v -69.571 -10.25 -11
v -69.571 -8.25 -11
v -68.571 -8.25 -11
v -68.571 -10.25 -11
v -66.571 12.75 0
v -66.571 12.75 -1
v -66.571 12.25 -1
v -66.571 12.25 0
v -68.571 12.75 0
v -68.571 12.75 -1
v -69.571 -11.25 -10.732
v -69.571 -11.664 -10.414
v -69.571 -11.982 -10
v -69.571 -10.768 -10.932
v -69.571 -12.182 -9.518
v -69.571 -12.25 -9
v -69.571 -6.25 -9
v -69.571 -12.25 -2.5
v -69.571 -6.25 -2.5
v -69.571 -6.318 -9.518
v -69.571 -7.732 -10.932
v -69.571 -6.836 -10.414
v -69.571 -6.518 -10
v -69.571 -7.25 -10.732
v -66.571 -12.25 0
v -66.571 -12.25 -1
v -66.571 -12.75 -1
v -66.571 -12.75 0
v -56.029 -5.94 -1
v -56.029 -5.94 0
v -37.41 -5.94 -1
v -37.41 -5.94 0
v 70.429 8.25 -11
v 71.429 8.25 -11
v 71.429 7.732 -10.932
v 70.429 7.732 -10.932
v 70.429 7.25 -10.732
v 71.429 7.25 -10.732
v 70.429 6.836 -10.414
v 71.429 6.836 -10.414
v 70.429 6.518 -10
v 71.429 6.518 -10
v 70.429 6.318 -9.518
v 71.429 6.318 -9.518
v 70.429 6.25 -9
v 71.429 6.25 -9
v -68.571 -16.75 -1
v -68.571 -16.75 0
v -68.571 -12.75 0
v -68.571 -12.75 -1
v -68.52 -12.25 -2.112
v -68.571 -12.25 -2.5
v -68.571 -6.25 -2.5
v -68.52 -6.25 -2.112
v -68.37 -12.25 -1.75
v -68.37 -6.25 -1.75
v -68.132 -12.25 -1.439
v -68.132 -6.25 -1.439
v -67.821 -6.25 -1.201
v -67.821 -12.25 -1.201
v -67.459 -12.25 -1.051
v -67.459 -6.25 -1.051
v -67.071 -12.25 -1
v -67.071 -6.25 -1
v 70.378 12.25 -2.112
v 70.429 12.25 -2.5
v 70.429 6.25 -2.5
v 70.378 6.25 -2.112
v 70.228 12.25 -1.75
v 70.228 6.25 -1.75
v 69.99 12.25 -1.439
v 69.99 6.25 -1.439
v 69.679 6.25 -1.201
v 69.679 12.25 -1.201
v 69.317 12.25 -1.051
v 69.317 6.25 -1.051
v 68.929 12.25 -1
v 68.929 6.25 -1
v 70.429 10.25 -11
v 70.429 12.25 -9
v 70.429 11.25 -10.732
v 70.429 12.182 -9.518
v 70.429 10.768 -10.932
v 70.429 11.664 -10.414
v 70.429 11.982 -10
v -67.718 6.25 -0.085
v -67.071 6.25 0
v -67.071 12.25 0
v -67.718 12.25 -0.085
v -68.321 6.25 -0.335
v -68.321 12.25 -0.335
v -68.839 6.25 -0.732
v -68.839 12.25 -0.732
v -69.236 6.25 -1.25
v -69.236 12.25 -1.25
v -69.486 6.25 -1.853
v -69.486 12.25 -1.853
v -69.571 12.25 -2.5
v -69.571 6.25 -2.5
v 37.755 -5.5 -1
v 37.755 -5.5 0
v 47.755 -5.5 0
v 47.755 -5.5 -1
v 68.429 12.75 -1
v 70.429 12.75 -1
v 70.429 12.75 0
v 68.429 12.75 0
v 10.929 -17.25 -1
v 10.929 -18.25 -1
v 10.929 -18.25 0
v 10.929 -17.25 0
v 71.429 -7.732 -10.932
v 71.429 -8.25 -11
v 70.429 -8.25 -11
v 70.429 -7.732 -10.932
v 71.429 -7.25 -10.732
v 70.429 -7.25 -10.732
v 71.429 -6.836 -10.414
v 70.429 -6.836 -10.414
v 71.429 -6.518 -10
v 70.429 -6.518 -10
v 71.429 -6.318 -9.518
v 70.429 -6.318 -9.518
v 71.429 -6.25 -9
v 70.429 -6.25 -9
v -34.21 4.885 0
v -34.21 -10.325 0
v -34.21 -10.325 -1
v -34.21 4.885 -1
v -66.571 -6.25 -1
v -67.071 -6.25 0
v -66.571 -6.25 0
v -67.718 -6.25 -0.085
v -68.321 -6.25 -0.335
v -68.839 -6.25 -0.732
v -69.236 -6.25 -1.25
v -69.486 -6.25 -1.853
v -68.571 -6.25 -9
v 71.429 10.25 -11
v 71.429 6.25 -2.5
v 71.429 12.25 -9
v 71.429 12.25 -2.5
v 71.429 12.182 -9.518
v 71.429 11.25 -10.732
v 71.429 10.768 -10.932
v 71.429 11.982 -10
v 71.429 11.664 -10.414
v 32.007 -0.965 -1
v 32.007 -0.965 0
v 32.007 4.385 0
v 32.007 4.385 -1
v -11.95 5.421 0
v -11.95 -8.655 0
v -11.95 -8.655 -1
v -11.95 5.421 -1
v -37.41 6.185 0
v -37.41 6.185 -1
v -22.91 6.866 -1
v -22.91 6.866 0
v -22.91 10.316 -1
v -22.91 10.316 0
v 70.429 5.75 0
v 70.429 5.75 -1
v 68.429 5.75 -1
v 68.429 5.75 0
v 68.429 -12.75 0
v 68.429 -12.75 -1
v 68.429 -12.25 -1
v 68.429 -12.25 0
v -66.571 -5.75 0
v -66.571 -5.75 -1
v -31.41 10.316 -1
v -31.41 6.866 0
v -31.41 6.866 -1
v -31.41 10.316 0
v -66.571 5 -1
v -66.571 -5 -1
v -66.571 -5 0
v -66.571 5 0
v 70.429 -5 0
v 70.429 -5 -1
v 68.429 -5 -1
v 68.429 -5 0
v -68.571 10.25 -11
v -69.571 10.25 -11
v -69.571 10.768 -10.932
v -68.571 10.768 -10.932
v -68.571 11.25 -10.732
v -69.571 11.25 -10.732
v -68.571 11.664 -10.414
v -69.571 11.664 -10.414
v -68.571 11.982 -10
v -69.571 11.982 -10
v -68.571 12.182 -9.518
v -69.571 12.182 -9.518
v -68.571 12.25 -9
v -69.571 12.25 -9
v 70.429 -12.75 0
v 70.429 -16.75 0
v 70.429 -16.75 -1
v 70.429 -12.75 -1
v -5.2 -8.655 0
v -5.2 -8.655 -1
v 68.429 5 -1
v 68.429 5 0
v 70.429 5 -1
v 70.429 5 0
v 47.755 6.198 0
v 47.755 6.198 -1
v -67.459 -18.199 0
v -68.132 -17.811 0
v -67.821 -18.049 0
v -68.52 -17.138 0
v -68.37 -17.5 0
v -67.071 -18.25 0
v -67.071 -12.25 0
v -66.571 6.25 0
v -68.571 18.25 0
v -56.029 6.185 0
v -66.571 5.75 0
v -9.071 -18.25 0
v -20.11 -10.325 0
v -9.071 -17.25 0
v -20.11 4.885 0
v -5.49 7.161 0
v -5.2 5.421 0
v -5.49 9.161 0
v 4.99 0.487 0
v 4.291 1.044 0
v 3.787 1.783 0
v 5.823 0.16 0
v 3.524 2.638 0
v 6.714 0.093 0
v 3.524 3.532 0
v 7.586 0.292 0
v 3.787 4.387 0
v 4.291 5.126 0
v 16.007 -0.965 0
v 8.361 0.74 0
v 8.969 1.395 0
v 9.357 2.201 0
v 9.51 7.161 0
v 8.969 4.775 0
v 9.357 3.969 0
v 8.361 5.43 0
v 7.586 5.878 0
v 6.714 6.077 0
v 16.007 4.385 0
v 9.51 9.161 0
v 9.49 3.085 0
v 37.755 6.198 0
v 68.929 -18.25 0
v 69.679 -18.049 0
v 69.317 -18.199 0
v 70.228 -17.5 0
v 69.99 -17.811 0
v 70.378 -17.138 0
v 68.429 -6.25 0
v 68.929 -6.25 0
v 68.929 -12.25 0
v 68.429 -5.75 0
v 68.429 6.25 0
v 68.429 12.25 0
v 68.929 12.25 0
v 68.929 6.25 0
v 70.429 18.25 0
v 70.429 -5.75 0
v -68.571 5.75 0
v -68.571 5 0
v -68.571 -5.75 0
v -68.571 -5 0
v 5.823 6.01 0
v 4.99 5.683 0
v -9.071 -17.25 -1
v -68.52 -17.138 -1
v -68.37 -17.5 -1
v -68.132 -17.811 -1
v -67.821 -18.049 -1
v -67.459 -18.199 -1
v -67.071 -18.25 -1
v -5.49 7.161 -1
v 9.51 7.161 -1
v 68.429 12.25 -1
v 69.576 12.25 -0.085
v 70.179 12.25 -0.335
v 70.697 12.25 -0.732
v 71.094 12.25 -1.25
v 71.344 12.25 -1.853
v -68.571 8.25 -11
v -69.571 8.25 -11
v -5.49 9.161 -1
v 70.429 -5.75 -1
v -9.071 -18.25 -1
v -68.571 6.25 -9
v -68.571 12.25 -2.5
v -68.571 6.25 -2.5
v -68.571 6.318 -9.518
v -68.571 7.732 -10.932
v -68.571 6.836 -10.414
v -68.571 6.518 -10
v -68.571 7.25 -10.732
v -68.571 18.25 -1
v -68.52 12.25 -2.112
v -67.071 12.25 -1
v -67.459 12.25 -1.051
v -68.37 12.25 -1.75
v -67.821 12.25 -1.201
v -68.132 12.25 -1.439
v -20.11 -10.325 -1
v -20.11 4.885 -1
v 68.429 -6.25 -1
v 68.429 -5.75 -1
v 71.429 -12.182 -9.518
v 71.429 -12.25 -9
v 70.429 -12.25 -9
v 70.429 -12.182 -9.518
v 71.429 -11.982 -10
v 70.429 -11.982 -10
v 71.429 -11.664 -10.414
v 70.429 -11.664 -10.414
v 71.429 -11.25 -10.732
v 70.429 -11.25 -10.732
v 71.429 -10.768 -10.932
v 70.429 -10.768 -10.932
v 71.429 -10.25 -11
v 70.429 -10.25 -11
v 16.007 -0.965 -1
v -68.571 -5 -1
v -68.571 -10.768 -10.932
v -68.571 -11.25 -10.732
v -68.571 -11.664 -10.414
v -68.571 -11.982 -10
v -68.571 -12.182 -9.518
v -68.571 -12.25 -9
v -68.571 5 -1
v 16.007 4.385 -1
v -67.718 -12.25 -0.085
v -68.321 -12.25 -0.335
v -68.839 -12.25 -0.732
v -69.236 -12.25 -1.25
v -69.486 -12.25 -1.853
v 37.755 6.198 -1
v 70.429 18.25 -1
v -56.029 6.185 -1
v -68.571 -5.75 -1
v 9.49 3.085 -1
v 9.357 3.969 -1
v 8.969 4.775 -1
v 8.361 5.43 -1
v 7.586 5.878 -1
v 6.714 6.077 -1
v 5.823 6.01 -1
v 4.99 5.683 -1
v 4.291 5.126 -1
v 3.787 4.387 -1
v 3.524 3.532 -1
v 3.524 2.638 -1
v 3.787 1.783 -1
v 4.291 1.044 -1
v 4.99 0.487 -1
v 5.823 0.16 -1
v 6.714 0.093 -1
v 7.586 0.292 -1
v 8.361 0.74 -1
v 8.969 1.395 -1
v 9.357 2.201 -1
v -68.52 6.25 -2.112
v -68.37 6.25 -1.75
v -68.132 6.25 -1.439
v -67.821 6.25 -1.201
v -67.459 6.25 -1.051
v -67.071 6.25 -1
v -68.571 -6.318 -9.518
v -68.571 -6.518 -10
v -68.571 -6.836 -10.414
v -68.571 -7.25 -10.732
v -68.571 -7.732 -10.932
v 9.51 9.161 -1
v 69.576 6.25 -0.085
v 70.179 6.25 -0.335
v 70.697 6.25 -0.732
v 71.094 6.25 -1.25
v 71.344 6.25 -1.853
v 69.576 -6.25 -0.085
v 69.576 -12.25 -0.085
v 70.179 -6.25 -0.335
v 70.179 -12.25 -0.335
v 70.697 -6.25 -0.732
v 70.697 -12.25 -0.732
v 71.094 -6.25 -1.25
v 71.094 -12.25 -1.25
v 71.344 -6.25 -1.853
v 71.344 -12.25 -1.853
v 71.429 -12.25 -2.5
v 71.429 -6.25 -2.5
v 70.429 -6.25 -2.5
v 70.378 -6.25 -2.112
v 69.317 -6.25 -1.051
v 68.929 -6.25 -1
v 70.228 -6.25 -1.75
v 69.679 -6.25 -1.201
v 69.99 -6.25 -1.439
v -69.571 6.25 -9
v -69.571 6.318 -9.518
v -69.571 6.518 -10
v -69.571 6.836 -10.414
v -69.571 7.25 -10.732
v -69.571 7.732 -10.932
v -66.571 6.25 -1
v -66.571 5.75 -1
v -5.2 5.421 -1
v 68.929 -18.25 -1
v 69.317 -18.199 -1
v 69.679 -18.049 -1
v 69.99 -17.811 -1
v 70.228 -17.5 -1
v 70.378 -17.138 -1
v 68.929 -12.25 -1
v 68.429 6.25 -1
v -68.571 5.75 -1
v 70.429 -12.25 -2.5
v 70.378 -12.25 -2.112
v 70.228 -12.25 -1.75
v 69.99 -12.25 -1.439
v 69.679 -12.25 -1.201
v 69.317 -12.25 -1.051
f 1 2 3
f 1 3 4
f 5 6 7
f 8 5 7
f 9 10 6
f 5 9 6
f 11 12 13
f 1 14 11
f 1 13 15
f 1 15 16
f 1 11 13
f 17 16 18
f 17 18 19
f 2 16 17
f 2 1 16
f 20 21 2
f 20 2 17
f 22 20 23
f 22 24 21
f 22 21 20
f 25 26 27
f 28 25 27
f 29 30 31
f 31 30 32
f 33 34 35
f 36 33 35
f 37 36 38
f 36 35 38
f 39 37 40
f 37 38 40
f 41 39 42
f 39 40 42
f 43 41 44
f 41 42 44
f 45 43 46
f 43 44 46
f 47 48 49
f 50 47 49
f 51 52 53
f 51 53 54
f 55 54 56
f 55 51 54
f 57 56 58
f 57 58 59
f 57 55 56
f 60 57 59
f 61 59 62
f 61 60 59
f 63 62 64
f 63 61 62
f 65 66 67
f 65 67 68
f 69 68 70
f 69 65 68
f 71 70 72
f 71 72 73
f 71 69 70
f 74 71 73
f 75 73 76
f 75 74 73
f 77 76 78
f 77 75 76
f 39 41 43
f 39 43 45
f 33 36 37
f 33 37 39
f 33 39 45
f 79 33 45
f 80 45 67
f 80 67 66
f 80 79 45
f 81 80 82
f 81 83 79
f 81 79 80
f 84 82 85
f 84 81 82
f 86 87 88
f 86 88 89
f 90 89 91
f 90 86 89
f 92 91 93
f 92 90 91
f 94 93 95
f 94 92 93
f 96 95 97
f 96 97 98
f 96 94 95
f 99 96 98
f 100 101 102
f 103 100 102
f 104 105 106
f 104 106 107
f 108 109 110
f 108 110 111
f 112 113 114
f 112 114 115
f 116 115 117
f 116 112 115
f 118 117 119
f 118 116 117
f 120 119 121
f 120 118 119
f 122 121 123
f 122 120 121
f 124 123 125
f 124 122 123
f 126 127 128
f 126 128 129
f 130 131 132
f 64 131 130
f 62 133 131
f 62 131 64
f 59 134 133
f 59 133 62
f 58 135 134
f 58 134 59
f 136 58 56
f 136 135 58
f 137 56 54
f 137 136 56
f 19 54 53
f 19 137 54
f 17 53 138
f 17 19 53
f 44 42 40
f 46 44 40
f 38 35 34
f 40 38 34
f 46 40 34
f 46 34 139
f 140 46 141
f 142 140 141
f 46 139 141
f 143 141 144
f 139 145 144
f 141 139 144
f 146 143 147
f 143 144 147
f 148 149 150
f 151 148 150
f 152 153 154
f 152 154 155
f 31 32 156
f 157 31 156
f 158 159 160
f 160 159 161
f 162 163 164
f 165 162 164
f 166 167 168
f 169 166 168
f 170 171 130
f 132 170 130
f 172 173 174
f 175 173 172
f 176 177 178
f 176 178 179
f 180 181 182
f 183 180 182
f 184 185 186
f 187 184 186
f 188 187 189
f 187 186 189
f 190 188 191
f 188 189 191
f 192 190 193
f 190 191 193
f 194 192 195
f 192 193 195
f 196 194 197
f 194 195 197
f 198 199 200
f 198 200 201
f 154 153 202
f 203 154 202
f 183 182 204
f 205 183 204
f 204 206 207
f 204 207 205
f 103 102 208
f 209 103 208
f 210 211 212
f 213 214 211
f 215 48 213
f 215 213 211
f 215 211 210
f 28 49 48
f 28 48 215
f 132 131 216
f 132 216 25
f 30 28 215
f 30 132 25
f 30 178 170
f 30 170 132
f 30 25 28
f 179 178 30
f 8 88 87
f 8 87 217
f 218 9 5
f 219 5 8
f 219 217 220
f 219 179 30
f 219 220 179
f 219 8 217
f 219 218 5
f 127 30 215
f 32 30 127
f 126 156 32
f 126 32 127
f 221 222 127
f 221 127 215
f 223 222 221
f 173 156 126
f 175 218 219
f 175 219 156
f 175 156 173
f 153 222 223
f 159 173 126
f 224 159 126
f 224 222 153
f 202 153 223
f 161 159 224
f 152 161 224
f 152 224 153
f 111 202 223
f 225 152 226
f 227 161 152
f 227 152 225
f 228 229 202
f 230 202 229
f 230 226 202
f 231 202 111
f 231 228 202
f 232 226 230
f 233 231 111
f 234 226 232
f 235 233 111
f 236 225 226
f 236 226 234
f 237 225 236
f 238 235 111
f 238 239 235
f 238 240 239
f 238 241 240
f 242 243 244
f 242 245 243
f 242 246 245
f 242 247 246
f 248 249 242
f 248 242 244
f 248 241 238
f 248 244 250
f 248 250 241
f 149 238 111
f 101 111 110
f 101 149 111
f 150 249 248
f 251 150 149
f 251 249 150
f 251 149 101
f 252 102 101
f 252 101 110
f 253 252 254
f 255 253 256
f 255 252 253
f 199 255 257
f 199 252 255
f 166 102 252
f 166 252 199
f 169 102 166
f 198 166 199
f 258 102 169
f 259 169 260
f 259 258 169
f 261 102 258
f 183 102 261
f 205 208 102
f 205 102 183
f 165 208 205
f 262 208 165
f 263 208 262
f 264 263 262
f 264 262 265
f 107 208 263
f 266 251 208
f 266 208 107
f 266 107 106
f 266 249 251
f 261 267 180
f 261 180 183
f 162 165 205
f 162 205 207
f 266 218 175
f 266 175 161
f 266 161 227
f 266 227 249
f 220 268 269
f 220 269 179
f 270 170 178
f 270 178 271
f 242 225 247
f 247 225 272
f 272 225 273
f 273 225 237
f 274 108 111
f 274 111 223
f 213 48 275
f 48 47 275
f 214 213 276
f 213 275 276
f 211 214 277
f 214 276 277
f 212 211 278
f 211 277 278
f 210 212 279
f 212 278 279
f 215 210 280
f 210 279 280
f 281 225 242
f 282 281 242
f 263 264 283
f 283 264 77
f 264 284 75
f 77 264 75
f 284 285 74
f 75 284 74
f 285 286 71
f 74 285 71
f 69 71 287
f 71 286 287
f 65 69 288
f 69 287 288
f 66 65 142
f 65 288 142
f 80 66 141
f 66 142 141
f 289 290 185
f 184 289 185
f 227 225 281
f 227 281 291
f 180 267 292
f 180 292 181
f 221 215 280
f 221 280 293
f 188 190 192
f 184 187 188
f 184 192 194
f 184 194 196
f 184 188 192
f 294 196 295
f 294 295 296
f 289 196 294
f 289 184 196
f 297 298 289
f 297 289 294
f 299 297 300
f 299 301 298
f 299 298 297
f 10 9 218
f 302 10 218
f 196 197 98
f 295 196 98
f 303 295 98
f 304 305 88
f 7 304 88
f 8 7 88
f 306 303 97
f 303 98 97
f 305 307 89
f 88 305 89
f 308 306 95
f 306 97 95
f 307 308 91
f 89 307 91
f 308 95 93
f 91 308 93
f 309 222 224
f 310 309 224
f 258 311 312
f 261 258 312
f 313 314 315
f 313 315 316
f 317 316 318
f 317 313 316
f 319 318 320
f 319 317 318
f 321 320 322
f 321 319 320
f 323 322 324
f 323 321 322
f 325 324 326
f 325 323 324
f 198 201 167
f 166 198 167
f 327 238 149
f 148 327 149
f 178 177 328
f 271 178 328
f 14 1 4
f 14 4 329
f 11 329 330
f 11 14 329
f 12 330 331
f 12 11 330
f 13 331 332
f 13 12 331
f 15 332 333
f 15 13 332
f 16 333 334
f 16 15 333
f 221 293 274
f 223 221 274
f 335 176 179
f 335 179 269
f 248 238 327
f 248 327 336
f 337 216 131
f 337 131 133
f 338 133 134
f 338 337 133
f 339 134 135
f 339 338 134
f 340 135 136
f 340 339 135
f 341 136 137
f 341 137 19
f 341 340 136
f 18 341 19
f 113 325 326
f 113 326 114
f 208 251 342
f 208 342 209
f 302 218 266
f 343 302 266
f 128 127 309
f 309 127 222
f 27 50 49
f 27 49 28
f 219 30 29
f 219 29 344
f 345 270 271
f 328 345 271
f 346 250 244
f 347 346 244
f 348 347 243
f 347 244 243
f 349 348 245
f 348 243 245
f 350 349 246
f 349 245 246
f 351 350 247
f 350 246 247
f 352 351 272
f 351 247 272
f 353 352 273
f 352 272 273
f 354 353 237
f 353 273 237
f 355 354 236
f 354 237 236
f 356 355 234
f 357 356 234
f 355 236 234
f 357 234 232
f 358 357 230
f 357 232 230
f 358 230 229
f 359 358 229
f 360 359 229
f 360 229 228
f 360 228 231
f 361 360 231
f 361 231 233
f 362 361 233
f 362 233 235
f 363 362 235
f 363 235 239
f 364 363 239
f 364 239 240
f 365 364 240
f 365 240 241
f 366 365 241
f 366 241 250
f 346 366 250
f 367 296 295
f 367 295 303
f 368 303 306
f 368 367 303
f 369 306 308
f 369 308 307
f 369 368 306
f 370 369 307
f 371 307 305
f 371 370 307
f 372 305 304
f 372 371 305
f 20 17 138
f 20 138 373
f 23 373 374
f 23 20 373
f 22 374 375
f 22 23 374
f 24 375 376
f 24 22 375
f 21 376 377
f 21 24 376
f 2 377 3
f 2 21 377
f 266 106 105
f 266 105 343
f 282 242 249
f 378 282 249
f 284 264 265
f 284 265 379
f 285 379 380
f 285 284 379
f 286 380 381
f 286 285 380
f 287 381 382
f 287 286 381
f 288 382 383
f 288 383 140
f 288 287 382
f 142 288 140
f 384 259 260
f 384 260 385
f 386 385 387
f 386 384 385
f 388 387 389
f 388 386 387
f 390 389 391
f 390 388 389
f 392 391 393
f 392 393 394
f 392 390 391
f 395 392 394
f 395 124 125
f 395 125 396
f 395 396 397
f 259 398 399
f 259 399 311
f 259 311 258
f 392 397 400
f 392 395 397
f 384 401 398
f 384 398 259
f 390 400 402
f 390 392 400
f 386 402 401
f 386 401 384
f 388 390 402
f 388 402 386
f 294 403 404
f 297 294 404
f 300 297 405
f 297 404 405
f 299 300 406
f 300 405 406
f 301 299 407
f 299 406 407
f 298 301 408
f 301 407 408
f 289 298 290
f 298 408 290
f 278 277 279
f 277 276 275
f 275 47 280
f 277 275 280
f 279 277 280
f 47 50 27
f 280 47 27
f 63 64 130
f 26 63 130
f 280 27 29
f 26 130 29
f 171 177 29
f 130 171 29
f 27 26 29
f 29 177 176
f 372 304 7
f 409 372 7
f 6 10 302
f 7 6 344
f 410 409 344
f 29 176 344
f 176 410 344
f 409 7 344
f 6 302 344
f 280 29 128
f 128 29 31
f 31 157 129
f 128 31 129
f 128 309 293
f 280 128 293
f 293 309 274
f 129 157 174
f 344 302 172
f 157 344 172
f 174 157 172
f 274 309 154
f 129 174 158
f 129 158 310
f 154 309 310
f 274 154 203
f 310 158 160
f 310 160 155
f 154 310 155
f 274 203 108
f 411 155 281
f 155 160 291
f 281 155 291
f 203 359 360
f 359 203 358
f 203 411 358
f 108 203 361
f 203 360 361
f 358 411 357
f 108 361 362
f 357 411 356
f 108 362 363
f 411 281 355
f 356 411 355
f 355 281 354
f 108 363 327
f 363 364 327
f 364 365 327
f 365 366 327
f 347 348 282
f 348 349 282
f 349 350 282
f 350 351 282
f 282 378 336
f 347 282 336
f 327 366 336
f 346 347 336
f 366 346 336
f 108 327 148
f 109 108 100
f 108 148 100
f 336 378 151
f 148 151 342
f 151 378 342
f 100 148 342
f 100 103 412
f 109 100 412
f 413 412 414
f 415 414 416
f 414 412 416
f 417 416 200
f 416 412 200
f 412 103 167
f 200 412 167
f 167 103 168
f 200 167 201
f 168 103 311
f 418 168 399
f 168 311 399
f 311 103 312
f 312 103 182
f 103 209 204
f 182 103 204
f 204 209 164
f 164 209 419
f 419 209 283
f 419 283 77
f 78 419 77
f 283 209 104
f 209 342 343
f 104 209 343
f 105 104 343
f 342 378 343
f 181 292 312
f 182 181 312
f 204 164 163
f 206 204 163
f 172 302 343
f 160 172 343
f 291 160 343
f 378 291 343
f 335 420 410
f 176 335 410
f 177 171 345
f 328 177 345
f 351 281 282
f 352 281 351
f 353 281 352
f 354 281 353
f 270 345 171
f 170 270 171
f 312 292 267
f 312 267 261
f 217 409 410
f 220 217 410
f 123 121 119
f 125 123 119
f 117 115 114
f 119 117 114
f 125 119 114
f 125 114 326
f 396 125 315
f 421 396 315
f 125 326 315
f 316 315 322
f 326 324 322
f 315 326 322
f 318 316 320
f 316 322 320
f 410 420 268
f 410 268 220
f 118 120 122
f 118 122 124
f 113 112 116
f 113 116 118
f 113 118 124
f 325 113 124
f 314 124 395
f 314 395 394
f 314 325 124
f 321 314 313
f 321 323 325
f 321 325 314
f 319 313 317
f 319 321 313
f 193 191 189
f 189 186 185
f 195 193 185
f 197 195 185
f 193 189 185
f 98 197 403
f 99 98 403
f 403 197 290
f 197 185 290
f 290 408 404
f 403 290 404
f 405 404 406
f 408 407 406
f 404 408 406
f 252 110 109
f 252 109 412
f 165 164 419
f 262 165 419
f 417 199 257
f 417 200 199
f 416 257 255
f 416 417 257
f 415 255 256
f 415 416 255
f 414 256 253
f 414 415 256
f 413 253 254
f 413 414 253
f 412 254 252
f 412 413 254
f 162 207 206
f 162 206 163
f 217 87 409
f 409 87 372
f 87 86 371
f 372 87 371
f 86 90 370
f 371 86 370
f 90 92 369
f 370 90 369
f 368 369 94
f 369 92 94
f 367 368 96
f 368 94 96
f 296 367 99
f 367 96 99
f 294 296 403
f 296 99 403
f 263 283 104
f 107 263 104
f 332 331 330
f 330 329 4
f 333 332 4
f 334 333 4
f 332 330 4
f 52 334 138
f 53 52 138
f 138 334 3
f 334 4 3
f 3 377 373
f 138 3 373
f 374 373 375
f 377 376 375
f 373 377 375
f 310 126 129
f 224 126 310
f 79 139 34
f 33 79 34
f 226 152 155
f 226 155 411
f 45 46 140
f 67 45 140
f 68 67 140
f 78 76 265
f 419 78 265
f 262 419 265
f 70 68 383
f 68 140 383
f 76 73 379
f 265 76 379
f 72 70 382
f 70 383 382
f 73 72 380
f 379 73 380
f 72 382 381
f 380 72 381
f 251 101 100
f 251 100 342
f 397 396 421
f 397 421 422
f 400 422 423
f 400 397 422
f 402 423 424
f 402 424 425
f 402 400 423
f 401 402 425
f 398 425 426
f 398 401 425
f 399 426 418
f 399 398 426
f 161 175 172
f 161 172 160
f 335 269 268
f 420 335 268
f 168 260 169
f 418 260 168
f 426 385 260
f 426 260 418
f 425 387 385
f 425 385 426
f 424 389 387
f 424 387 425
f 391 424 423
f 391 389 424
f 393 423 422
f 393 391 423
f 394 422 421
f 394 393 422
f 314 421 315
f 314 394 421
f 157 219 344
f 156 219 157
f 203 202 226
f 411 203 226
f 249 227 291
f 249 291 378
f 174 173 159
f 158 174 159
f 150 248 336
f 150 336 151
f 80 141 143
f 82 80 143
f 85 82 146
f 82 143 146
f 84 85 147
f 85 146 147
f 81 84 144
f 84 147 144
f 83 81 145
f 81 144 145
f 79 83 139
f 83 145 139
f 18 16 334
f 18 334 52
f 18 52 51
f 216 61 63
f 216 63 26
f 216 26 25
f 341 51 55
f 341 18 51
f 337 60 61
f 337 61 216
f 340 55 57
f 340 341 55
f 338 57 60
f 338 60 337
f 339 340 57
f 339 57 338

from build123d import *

# Parameters (mm, degrees)
SKETCH1_W                       = 139
SKETCH1_H                       = 36.5
BASE_FLANGE1_DEPTH              = 1
EDGE_FLANGE1_STRIP_W            = 7
EDGE_FLANGE1_STRIP_H            = 1
EDGE_FLANGE1_STRIP_CUT_DEPTH    = 6
EDGE_FLANGE1_RELIEF_W           = 7.5
EDGE_FLANGE1_RELIEF_H           = 0.5
EDGE_FLANGE1_RELIEF_CUT_DEPTH   = 1
EDGE_FLANGE1_STRIP_2_W          = 7
EDGE_FLANGE1_STRIP_2_H          = 1
EDGE_FLANGE1_STRIP_CUT_2_DEPTH  = 6
EDGE_FLANGE1_RELIEF_2_W         = 7.5
EDGE_FLANGE1_RELIEF_2_H         = 0.5
EDGE_FLANGE1_RELIEF_CUT_2_DEPTH = 1
EDGE_FLANGE1_DEPTH              = 6
EDGE_FLANGE1_START              = -1
EDGE_FLANGE1_FLAT_DEPTH         = 1
EDGE_FLANGE1_BEND_DEPTH         = 6
EDGE_FLANGE1_FLAT_2_DEPTH       = 1
EDGE_FLANGE2_STRIP_W            = 7
EDGE_FLANGE2_STRIP_H            = 1
EDGE_FLANGE2_STRIP_CUT_DEPTH    = 6
EDGE_FLANGE2_RELIEF_W           = 7.5
EDGE_FLANGE2_RELIEF_H           = 0.5
EDGE_FLANGE2_RELIEF_CUT_DEPTH   = 1
EDGE_FLANGE2_STRIP_2_W          = 7
EDGE_FLANGE2_STRIP_2_H          = 1
EDGE_FLANGE2_STRIP_CUT_2_DEPTH  = 6
EDGE_FLANGE2_RELIEF_2_W         = 7.5
EDGE_FLANGE2_RELIEF_2_H         = 0.5
EDGE_FLANGE2_RELIEF_CUT_2_DEPTH = 1
EDGE_FLANGE2_DEPTH              = 6
EDGE_FLANGE2_START              = 1
EDGE_FLANGE2_FLAT_DEPTH         = 1
EDGE_FLANGE2_BEND_DEPTH         = 6
EDGE_FLANGE2_FLAT_2_DEPTH       = 1
SKETCH20_W                      = 20
SKETCH20_H                      = 1
SKETCH20_W_2                    = 2
SKETCH20_H_2                    = 10
CUT_EXTRUDE1_DEPTH              = 10
FILLET1_R                       = 1.5
SKETCH21_W                      = 15
SKETCH21_H                      = 2
SKETCH21_W_2                    = 17.619171599
SKETCH21_H_2                    = 11.12514716
SKETCH21_W_3                    = 13.1
SKETCH21_H_3                    = 14.209512824
SKETCH21_W_4                    = 5.75
SKETCH21_H_4                    = 13.075429167
SKETCH21_H_5                    = 4.35
CUT_EXTRUDE2_DEPTH              = 10
SKETCH22_R                      = 3
SKETCH22_W                      = 8.50018288
SKETCH22_H                      = 3.45
SKETCH22_W_2                    = 10.00000232
SKETCH22_H_2                    = 11.697941419
SKETCH22_W_3                    = 18.619171599
SKETCH22_H_3                    = 12.12514716
SKETCH22_W_4                    = 17.619171599
SKETCH22_H_4                    = 11.12514716
SKETCH22_W_5                    = 14.1
SKETCH22_H_5                    = 15.209512824
SKETCH22_W_6                    = 13.1
SKETCH22_H_6                    = 14.209512824
SKETCH22_W_7                    = 6.75
SKETCH22_H_7                    = 14.075429167
SKETCH22_W_8                    = 5.75
SKETCH22_H_8                    = 13.075429167
SKETCH22_W_9                    = 16
SKETCH22_H_9                    = 5.35
SKETCH22_W_10                   = 15
SKETCH22_H_10                   = 4.35
CUT_EXTRUDE3_DEPTH              = 10


# Sheet-metal steps are written as plain solids
with BuildPart() as part:
    # Sketch1 → Base-Flange1 (new body)
    with BuildSketch(Plane.XY):
        with Locations((0.929014267, 0)):
            Rectangle(SKETCH1_W, SKETCH1_H)
    extrude(amount=-BASE_FLANGE1_DEPTH)

    # Edge-Flange1 strip (across the edge) → Edge-Flange1 strip cut (cut)
    with BuildSketch(Plane(origin=(-68.570985733, 6.25, -1), x_dir=(1, 0, 0), z_dir=(0, 1, 0))):
        with Locations((-2, -0.5)):
            Rectangle(EDGE_FLANGE1_STRIP_W, EDGE_FLANGE1_STRIP_H)
    extrude(amount=EDGE_FLANGE1_STRIP_CUT_DEPTH, mode=Mode.SUBTRACT)

    # Edge-Flange1 relief (on the sheet) → Edge-Flange1 relief cut (cut)
    with BuildSketch(Plane(origin=(-67.070985733, 6.25, -1), x_dir=(1, 0, 0), z_dir=(0, 0, -1))):
        with Locations((-3.25, 0.25)):
            Rectangle(EDGE_FLANGE1_RELIEF_W, EDGE_FLANGE1_RELIEF_H)
        with Locations((-3.25, -6.25)):
            Rectangle(EDGE_FLANGE1_RELIEF_W, EDGE_FLANGE1_RELIEF_H)
    extrude(amount=-EDGE_FLANGE1_RELIEF_CUT_DEPTH, mode=Mode.SUBTRACT)

    # Edge-Flange1 strip 2 (across the edge) → Edge-Flange1 strip cut 2 (cut)
    with BuildSketch(Plane(origin=(70.429014267, 12.25, -1), x_dir=(-1, 0, 0), z_dir=(0, -1, 0))):
        with Locations((-2, -0.5)):
            Rectangle(EDGE_FLANGE1_STRIP_2_W, EDGE_FLANGE1_STRIP_2_H)
    extrude(amount=EDGE_FLANGE1_STRIP_CUT_2_DEPTH, mode=Mode.SUBTRACT)

    # Edge-Flange1 relief 2 (on the sheet) → Edge-Flange1 relief cut 2 (cut)
    with BuildSketch(Plane(origin=(68.929014267, 12.25, -1), x_dir=(-1, 0, 0), z_dir=(0, 0, -1))):
        with Locations((-3.25, 0.25)):
            Rectangle(EDGE_FLANGE1_RELIEF_2_W, EDGE_FLANGE1_RELIEF_2_H)
        with Locations((-3.25, -6.25)):
            Rectangle(EDGE_FLANGE1_RELIEF_2_W, EDGE_FLANGE1_RELIEF_2_H)
    extrude(amount=-EDGE_FLANGE1_RELIEF_CUT_2_DEPTH, mode=Mode.SUBTRACT)

    # Edge-Flange1 bend section (across the edge) → Edge-Flange1 (add)
    with BuildSketch(Plane(origin=(-68.570985733, 6.25, -1), x_dir=(1, 0, 0), z_dir=(0, 1, 0))):
        with BuildLine():
            Line((-1, 1.5), (0, 1.5))
            ThreePointArc((0, 1.5), (0.439339828, 0.439339828), (1.5, 0))
            Line((1.5, 0), (1.5, -1))
            ThreePointArc((1.5, -1), (-0.267766953, -0.267766953), (-1, 1.5))
        make_face()
    extrude(amount=EDGE_FLANGE1_DEPTH)

    # Edge-Flange1 profile (on flange) → Edge-Flange1 flat (add)
    with BuildSketch(Plane(origin=(-68.570985733, 0, -1), x_dir=(0, -1, 0), z_dir=(1, 0, 0)).offset(EDGE_FLANGE1_START)):
        with BuildLine():
            ThreePointArc((-6.25, 8), (-6.835786438, 9.414213562), (-8.25, 10))
            Line((-8.25, 10), (-10.25, 10))
            ThreePointArc((-10.25, 10), (-11.664213562, 9.414213562), (-12.25, 8))
            Line((-12.25, 8), (-12.25, 1.5))
            Line((-12.25, 1.5), (-6.25, 1.5))
            Line((-6.25, 1.5), (-6.25, 8))
        make_face()
    extrude(amount=EDGE_FLANGE1_FLAT_DEPTH)

    # Edge-Flange1 bend section 2 (across the edge) → Edge-Flange1 bend (add)
    with BuildSketch(Plane(origin=(70.429014267, 12.25, -1), x_dir=(-1, 0, 0), z_dir=(0, -1, 0))):
        with BuildLine():
            Line((-1, 1.5), (0, 1.5))
            ThreePointArc((0, 1.5), (0.439339828, 0.439339828), (1.5, 0))
            Line((1.5, 0), (1.5, -1))
            ThreePointArc((1.5, -1), (-0.267766953, -0.267766953), (-1, 1.5))
        make_face()
    extrude(amount=EDGE_FLANGE1_BEND_DEPTH)

    # Edge-Flange1 profile 2 (on flange) → Edge-Flange1 flat 2 (add)
    with BuildSketch(Plane(origin=(70.429014267, 0, -1), x_dir=(0, 1, 0), z_dir=(-1, 0, 0)).offset(EDGE_FLANGE1_START)):
        with BuildLine():
            Line((12.25, 1.5), (12.25, 8))
            ThreePointArc((12.25, 8), (11.664213562, 9.414213562), (10.25, 10))
            Line((10.25, 10), (8.25, 10))
            ThreePointArc((8.25, 10), (6.835786438, 9.414213562), (6.25, 8))
            Line((6.25, 8), (6.25, 1.5))
            Line((6.25, 1.5), (12.25, 1.5))
        make_face()
    extrude(amount=EDGE_FLANGE1_FLAT_2_DEPTH)

    # Edge-Flange2 strip (across the edge) → Edge-Flange2 strip cut (cut)
    with BuildSketch(Plane(origin=(70.429014267, -6.25, -1), x_dir=(-1, 0, 0), z_dir=(0, -1, 0))):
        with Locations((-2, -0.5)):
            Rectangle(EDGE_FLANGE2_STRIP_W, EDGE_FLANGE2_STRIP_H)
    extrude(amount=EDGE_FLANGE2_STRIP_CUT_DEPTH, mode=Mode.SUBTRACT)

    # Edge-Flange2 relief (on the sheet) → Edge-Flange2 relief cut (cut)
    with BuildSketch(Plane(origin=(68.929014267, -6.25, -1), x_dir=(-1, 0, 0), z_dir=(0, 0, -1))):
        with Locations((-3.25, 0.25)):
            Rectangle(EDGE_FLANGE2_RELIEF_W, EDGE_FLANGE2_RELIEF_H)
        with Locations((-3.25, -6.25)):
            Rectangle(EDGE_FLANGE2_RELIEF_W, EDGE_FLANGE2_RELIEF_H)
    extrude(amount=-EDGE_FLANGE2_RELIEF_CUT_DEPTH, mode=Mode.SUBTRACT)

    # Edge-Flange2 strip 2 (across the edge) → Edge-Flange2 strip cut 2 (cut)
    with BuildSketch(Plane(origin=(-68.570985733, -12.25, -1), x_dir=(1, 0, 0), z_dir=(0, 1, 0))):
        with Locations((-2, -0.5)):
            Rectangle(EDGE_FLANGE2_STRIP_2_W, EDGE_FLANGE2_STRIP_2_H)
    extrude(amount=EDGE_FLANGE2_STRIP_CUT_2_DEPTH, mode=Mode.SUBTRACT)

    # Edge-Flange2 relief 2 (on the sheet) → Edge-Flange2 relief cut 2 (cut)
    with BuildSketch(Plane(origin=(-67.070985733, -12.25, -1), x_dir=(1, 0, 0), z_dir=(0, 0, -1))):
        with Locations((-3.25, 0.25)):
            Rectangle(EDGE_FLANGE2_RELIEF_2_W, EDGE_FLANGE2_RELIEF_2_H)
        with Locations((-3.25, -6.25)):
            Rectangle(EDGE_FLANGE2_RELIEF_2_W, EDGE_FLANGE2_RELIEF_2_H)
    extrude(amount=-EDGE_FLANGE2_RELIEF_CUT_2_DEPTH, mode=Mode.SUBTRACT)

    # Edge-Flange2 bend section (across the edge) → Edge-Flange2 (add)
    with BuildSketch(Plane(origin=(70.429014267, -6.25, -1), x_dir=(-1, 0, 0), z_dir=(0, -1, 0))):
        with BuildLine():
            Line((-1, 1.5), (0, 1.5))
            ThreePointArc((0, 1.5), (0.439339828, 0.439339828), (1.5, 0))
            Line((1.5, 0), (1.5, -1))
            ThreePointArc((1.5, -1), (-0.267766953, -0.267766953), (-1, 1.5))
        make_face()
    extrude(amount=EDGE_FLANGE2_DEPTH)

    # Edge-Flange2 profile (on flange) → Edge-Flange2 flat (add)
    with BuildSketch(Plane(origin=(70.429014267, 0, -1), x_dir=(0, -1, 0), z_dir=(1, 0, 0)).offset(EDGE_FLANGE2_START)):
        with BuildLine():
            Line((12.25, 1.5), (12.25, 8))
            ThreePointArc((12.25, 8), (11.664213562, 9.414213562), (10.25, 10))
            Line((10.25, 10), (8.25, 10))
            ThreePointArc((8.25, 10), (6.835786438, 9.414213562), (6.25, 8))
            Line((6.25, 8), (6.25, 1.5))
            Line((6.25, 1.5), (12.25, 1.5))
        make_face()
    extrude(amount=-EDGE_FLANGE2_FLAT_DEPTH)

    # Edge-Flange2 bend section 2 (across the edge) → Edge-Flange2 bend (add)
    with BuildSketch(Plane(origin=(-68.570985733, -12.25, -1), x_dir=(1, 0, 0), z_dir=(0, 1, 0))):
        with BuildLine():
            Line((-1, 1.5), (0, 1.5))
            ThreePointArc((0, 1.5), (0.439339828, 0.439339828), (1.5, 0))
            Line((1.5, 0), (1.5, -1))
            ThreePointArc((1.5, -1), (-0.267766953, -0.267766953), (-1, 1.5))
        make_face()
    extrude(amount=EDGE_FLANGE2_BEND_DEPTH)

    # Edge-Flange2 profile 2 (on flange) → Edge-Flange2 flat 2 (add)
    with BuildSketch(Plane(origin=(-68.570985733, 0, -1), x_dir=(0, 1, 0), z_dir=(-1, 0, 0)).offset(EDGE_FLANGE2_START)):
        with BuildLine():
            ThreePointArc((-6.25, 8), (-6.835786438, 9.414213562), (-8.25, 10))
            Line((-8.25, 10), (-10.25, 10))
            ThreePointArc((-10.25, 10), (-11.664213562, 9.414213562), (-12.25, 8))
            Line((-12.25, 8), (-12.25, 1.5))
            Line((-12.25, 1.5), (-6.25, 1.5))
            Line((-6.25, 1.5), (-6.25, 8))
        make_face()
    extrude(amount=-EDGE_FLANGE2_FLAT_2_DEPTH)

    # Sketch20 → Cut-Extrude1 (cut)
    with BuildSketch(Plane(origin=(0, 0, -1), x_dir=(-1, 0, 0), z_dir=(0, 0, -1))):
        with Locations((-0.929014267, -17.75)):
            Rectangle(SKETCH20_W, SKETCH20_H)
        with Locations((-69.429014267, 0)):
            Rectangle(SKETCH20_W_2, SKETCH20_H_2)
        with Locations((67.570985733, 0)):
            Rectangle(SKETCH20_W_2, SKETCH20_H_2)
    extrude(amount=-CUT_EXTRUDE1_DEPTH, mode=Mode.SUBTRACT)

    # Fillet1
    fillet1_edges = [part.edges().sort_by_distance(p)[0] for p in [
        (70.429014267, -18.25, -0.5),
        (-68.570985733, -18.25, -0.5),
    ]]
    fillet(fillet1_edges, radius=FILLET1_R)

    # Sketch21 → Cut-Extrude2 (cut)
    with BuildSketch(Plane.XY):
        with Locations((2.010056647, 8.16084548)):
            Rectangle(SKETCH21_W, SKETCH21_H)
        with Locations((-46.719481313, 0.12237266)):
            Rectangle(SKETCH21_W_2, SKETCH21_H_2)
        with Locations((-27.159885853, -2.720244568)):
            Rectangle(SKETCH21_W_3, SKETCH21_H_3)
        with Locations((-8.575130533, -1.617166732)):
            Rectangle(SKETCH21_W_4, SKETCH21_H_4)
        with Locations((24.006575187, 1.71009184)):
            Rectangle(SKETCH21_W, SKETCH21_H_5)
    extrude(amount=-CUT_EXTRUDE2_DEPTH, mode=Mode.SUBTRACT)

    # Sketch22 → Cut-Extrude3 (cut)
    # profile 1 of 7: a face of its own
    with BuildSketch(Plane.XY):
        with Locations((6.490209407, 3.08500012)):
            Circle(SKETCH22_R)
    # profile 2 of 7: a face of its own
    with BuildSketch(Plane.XY):
        with Locations((-27.159977293, 8.5910876)):
            Rectangle(SKETCH22_W, SKETCH22_H)
    # profile 3 of 7: a face of its own
    with BuildSketch(Plane.XY):
        with Locations((42.755059407, 0.349211789)):
            Rectangle(SKETCH22_W_2, SKETCH22_H_2)
    # profile 4 of 7: a face of its own
    with BuildSketch(Plane.XY):
        with Locations((-46.719481313, 0.12237266)):
            Rectangle(SKETCH22_W_3, SKETCH22_H_3)
        with Locations((-46.719481313, 0.12237266)):
            Rectangle(SKETCH22_W_4, SKETCH22_H_4, mode=Mode.SUBTRACT)
    # profile 5 of 7: a face of its own
    with BuildSketch(Plane.XY):
        with Locations((-27.159885853, -2.720244568)):
            Rectangle(SKETCH22_W_5, SKETCH22_H_5)
        with Locations((-27.159885853, -2.720244568)):
            Rectangle(SKETCH22_W_6, SKETCH22_H_6, mode=Mode.SUBTRACT)
    # profile 6 of 7: a face of its own
    with BuildSketch(Plane.XY):
        with Locations((-8.575130533, -1.617166732)):
            Rectangle(SKETCH22_W_7, SKETCH22_H_7)
        with Locations((-8.575130533, -1.617166732)):
            Rectangle(SKETCH22_W_8, SKETCH22_H_8, mode=Mode.SUBTRACT)
    # profile 7 of 7: a face of its own
    with BuildSketch(Plane.XY):
        with Locations((24.006575187, 1.71009184)):
            Rectangle(SKETCH22_W_9, SKETCH22_H_9)
        with Locations((24.006575187, 1.71009184)):
            Rectangle(SKETCH22_W_10, SKETCH22_H_10, mode=Mode.SUBTRACT)
    extrude(amount=-CUT_EXTRUDE3_DEPTH, mode=Mode.SUBTRACT)


solid = part.part
